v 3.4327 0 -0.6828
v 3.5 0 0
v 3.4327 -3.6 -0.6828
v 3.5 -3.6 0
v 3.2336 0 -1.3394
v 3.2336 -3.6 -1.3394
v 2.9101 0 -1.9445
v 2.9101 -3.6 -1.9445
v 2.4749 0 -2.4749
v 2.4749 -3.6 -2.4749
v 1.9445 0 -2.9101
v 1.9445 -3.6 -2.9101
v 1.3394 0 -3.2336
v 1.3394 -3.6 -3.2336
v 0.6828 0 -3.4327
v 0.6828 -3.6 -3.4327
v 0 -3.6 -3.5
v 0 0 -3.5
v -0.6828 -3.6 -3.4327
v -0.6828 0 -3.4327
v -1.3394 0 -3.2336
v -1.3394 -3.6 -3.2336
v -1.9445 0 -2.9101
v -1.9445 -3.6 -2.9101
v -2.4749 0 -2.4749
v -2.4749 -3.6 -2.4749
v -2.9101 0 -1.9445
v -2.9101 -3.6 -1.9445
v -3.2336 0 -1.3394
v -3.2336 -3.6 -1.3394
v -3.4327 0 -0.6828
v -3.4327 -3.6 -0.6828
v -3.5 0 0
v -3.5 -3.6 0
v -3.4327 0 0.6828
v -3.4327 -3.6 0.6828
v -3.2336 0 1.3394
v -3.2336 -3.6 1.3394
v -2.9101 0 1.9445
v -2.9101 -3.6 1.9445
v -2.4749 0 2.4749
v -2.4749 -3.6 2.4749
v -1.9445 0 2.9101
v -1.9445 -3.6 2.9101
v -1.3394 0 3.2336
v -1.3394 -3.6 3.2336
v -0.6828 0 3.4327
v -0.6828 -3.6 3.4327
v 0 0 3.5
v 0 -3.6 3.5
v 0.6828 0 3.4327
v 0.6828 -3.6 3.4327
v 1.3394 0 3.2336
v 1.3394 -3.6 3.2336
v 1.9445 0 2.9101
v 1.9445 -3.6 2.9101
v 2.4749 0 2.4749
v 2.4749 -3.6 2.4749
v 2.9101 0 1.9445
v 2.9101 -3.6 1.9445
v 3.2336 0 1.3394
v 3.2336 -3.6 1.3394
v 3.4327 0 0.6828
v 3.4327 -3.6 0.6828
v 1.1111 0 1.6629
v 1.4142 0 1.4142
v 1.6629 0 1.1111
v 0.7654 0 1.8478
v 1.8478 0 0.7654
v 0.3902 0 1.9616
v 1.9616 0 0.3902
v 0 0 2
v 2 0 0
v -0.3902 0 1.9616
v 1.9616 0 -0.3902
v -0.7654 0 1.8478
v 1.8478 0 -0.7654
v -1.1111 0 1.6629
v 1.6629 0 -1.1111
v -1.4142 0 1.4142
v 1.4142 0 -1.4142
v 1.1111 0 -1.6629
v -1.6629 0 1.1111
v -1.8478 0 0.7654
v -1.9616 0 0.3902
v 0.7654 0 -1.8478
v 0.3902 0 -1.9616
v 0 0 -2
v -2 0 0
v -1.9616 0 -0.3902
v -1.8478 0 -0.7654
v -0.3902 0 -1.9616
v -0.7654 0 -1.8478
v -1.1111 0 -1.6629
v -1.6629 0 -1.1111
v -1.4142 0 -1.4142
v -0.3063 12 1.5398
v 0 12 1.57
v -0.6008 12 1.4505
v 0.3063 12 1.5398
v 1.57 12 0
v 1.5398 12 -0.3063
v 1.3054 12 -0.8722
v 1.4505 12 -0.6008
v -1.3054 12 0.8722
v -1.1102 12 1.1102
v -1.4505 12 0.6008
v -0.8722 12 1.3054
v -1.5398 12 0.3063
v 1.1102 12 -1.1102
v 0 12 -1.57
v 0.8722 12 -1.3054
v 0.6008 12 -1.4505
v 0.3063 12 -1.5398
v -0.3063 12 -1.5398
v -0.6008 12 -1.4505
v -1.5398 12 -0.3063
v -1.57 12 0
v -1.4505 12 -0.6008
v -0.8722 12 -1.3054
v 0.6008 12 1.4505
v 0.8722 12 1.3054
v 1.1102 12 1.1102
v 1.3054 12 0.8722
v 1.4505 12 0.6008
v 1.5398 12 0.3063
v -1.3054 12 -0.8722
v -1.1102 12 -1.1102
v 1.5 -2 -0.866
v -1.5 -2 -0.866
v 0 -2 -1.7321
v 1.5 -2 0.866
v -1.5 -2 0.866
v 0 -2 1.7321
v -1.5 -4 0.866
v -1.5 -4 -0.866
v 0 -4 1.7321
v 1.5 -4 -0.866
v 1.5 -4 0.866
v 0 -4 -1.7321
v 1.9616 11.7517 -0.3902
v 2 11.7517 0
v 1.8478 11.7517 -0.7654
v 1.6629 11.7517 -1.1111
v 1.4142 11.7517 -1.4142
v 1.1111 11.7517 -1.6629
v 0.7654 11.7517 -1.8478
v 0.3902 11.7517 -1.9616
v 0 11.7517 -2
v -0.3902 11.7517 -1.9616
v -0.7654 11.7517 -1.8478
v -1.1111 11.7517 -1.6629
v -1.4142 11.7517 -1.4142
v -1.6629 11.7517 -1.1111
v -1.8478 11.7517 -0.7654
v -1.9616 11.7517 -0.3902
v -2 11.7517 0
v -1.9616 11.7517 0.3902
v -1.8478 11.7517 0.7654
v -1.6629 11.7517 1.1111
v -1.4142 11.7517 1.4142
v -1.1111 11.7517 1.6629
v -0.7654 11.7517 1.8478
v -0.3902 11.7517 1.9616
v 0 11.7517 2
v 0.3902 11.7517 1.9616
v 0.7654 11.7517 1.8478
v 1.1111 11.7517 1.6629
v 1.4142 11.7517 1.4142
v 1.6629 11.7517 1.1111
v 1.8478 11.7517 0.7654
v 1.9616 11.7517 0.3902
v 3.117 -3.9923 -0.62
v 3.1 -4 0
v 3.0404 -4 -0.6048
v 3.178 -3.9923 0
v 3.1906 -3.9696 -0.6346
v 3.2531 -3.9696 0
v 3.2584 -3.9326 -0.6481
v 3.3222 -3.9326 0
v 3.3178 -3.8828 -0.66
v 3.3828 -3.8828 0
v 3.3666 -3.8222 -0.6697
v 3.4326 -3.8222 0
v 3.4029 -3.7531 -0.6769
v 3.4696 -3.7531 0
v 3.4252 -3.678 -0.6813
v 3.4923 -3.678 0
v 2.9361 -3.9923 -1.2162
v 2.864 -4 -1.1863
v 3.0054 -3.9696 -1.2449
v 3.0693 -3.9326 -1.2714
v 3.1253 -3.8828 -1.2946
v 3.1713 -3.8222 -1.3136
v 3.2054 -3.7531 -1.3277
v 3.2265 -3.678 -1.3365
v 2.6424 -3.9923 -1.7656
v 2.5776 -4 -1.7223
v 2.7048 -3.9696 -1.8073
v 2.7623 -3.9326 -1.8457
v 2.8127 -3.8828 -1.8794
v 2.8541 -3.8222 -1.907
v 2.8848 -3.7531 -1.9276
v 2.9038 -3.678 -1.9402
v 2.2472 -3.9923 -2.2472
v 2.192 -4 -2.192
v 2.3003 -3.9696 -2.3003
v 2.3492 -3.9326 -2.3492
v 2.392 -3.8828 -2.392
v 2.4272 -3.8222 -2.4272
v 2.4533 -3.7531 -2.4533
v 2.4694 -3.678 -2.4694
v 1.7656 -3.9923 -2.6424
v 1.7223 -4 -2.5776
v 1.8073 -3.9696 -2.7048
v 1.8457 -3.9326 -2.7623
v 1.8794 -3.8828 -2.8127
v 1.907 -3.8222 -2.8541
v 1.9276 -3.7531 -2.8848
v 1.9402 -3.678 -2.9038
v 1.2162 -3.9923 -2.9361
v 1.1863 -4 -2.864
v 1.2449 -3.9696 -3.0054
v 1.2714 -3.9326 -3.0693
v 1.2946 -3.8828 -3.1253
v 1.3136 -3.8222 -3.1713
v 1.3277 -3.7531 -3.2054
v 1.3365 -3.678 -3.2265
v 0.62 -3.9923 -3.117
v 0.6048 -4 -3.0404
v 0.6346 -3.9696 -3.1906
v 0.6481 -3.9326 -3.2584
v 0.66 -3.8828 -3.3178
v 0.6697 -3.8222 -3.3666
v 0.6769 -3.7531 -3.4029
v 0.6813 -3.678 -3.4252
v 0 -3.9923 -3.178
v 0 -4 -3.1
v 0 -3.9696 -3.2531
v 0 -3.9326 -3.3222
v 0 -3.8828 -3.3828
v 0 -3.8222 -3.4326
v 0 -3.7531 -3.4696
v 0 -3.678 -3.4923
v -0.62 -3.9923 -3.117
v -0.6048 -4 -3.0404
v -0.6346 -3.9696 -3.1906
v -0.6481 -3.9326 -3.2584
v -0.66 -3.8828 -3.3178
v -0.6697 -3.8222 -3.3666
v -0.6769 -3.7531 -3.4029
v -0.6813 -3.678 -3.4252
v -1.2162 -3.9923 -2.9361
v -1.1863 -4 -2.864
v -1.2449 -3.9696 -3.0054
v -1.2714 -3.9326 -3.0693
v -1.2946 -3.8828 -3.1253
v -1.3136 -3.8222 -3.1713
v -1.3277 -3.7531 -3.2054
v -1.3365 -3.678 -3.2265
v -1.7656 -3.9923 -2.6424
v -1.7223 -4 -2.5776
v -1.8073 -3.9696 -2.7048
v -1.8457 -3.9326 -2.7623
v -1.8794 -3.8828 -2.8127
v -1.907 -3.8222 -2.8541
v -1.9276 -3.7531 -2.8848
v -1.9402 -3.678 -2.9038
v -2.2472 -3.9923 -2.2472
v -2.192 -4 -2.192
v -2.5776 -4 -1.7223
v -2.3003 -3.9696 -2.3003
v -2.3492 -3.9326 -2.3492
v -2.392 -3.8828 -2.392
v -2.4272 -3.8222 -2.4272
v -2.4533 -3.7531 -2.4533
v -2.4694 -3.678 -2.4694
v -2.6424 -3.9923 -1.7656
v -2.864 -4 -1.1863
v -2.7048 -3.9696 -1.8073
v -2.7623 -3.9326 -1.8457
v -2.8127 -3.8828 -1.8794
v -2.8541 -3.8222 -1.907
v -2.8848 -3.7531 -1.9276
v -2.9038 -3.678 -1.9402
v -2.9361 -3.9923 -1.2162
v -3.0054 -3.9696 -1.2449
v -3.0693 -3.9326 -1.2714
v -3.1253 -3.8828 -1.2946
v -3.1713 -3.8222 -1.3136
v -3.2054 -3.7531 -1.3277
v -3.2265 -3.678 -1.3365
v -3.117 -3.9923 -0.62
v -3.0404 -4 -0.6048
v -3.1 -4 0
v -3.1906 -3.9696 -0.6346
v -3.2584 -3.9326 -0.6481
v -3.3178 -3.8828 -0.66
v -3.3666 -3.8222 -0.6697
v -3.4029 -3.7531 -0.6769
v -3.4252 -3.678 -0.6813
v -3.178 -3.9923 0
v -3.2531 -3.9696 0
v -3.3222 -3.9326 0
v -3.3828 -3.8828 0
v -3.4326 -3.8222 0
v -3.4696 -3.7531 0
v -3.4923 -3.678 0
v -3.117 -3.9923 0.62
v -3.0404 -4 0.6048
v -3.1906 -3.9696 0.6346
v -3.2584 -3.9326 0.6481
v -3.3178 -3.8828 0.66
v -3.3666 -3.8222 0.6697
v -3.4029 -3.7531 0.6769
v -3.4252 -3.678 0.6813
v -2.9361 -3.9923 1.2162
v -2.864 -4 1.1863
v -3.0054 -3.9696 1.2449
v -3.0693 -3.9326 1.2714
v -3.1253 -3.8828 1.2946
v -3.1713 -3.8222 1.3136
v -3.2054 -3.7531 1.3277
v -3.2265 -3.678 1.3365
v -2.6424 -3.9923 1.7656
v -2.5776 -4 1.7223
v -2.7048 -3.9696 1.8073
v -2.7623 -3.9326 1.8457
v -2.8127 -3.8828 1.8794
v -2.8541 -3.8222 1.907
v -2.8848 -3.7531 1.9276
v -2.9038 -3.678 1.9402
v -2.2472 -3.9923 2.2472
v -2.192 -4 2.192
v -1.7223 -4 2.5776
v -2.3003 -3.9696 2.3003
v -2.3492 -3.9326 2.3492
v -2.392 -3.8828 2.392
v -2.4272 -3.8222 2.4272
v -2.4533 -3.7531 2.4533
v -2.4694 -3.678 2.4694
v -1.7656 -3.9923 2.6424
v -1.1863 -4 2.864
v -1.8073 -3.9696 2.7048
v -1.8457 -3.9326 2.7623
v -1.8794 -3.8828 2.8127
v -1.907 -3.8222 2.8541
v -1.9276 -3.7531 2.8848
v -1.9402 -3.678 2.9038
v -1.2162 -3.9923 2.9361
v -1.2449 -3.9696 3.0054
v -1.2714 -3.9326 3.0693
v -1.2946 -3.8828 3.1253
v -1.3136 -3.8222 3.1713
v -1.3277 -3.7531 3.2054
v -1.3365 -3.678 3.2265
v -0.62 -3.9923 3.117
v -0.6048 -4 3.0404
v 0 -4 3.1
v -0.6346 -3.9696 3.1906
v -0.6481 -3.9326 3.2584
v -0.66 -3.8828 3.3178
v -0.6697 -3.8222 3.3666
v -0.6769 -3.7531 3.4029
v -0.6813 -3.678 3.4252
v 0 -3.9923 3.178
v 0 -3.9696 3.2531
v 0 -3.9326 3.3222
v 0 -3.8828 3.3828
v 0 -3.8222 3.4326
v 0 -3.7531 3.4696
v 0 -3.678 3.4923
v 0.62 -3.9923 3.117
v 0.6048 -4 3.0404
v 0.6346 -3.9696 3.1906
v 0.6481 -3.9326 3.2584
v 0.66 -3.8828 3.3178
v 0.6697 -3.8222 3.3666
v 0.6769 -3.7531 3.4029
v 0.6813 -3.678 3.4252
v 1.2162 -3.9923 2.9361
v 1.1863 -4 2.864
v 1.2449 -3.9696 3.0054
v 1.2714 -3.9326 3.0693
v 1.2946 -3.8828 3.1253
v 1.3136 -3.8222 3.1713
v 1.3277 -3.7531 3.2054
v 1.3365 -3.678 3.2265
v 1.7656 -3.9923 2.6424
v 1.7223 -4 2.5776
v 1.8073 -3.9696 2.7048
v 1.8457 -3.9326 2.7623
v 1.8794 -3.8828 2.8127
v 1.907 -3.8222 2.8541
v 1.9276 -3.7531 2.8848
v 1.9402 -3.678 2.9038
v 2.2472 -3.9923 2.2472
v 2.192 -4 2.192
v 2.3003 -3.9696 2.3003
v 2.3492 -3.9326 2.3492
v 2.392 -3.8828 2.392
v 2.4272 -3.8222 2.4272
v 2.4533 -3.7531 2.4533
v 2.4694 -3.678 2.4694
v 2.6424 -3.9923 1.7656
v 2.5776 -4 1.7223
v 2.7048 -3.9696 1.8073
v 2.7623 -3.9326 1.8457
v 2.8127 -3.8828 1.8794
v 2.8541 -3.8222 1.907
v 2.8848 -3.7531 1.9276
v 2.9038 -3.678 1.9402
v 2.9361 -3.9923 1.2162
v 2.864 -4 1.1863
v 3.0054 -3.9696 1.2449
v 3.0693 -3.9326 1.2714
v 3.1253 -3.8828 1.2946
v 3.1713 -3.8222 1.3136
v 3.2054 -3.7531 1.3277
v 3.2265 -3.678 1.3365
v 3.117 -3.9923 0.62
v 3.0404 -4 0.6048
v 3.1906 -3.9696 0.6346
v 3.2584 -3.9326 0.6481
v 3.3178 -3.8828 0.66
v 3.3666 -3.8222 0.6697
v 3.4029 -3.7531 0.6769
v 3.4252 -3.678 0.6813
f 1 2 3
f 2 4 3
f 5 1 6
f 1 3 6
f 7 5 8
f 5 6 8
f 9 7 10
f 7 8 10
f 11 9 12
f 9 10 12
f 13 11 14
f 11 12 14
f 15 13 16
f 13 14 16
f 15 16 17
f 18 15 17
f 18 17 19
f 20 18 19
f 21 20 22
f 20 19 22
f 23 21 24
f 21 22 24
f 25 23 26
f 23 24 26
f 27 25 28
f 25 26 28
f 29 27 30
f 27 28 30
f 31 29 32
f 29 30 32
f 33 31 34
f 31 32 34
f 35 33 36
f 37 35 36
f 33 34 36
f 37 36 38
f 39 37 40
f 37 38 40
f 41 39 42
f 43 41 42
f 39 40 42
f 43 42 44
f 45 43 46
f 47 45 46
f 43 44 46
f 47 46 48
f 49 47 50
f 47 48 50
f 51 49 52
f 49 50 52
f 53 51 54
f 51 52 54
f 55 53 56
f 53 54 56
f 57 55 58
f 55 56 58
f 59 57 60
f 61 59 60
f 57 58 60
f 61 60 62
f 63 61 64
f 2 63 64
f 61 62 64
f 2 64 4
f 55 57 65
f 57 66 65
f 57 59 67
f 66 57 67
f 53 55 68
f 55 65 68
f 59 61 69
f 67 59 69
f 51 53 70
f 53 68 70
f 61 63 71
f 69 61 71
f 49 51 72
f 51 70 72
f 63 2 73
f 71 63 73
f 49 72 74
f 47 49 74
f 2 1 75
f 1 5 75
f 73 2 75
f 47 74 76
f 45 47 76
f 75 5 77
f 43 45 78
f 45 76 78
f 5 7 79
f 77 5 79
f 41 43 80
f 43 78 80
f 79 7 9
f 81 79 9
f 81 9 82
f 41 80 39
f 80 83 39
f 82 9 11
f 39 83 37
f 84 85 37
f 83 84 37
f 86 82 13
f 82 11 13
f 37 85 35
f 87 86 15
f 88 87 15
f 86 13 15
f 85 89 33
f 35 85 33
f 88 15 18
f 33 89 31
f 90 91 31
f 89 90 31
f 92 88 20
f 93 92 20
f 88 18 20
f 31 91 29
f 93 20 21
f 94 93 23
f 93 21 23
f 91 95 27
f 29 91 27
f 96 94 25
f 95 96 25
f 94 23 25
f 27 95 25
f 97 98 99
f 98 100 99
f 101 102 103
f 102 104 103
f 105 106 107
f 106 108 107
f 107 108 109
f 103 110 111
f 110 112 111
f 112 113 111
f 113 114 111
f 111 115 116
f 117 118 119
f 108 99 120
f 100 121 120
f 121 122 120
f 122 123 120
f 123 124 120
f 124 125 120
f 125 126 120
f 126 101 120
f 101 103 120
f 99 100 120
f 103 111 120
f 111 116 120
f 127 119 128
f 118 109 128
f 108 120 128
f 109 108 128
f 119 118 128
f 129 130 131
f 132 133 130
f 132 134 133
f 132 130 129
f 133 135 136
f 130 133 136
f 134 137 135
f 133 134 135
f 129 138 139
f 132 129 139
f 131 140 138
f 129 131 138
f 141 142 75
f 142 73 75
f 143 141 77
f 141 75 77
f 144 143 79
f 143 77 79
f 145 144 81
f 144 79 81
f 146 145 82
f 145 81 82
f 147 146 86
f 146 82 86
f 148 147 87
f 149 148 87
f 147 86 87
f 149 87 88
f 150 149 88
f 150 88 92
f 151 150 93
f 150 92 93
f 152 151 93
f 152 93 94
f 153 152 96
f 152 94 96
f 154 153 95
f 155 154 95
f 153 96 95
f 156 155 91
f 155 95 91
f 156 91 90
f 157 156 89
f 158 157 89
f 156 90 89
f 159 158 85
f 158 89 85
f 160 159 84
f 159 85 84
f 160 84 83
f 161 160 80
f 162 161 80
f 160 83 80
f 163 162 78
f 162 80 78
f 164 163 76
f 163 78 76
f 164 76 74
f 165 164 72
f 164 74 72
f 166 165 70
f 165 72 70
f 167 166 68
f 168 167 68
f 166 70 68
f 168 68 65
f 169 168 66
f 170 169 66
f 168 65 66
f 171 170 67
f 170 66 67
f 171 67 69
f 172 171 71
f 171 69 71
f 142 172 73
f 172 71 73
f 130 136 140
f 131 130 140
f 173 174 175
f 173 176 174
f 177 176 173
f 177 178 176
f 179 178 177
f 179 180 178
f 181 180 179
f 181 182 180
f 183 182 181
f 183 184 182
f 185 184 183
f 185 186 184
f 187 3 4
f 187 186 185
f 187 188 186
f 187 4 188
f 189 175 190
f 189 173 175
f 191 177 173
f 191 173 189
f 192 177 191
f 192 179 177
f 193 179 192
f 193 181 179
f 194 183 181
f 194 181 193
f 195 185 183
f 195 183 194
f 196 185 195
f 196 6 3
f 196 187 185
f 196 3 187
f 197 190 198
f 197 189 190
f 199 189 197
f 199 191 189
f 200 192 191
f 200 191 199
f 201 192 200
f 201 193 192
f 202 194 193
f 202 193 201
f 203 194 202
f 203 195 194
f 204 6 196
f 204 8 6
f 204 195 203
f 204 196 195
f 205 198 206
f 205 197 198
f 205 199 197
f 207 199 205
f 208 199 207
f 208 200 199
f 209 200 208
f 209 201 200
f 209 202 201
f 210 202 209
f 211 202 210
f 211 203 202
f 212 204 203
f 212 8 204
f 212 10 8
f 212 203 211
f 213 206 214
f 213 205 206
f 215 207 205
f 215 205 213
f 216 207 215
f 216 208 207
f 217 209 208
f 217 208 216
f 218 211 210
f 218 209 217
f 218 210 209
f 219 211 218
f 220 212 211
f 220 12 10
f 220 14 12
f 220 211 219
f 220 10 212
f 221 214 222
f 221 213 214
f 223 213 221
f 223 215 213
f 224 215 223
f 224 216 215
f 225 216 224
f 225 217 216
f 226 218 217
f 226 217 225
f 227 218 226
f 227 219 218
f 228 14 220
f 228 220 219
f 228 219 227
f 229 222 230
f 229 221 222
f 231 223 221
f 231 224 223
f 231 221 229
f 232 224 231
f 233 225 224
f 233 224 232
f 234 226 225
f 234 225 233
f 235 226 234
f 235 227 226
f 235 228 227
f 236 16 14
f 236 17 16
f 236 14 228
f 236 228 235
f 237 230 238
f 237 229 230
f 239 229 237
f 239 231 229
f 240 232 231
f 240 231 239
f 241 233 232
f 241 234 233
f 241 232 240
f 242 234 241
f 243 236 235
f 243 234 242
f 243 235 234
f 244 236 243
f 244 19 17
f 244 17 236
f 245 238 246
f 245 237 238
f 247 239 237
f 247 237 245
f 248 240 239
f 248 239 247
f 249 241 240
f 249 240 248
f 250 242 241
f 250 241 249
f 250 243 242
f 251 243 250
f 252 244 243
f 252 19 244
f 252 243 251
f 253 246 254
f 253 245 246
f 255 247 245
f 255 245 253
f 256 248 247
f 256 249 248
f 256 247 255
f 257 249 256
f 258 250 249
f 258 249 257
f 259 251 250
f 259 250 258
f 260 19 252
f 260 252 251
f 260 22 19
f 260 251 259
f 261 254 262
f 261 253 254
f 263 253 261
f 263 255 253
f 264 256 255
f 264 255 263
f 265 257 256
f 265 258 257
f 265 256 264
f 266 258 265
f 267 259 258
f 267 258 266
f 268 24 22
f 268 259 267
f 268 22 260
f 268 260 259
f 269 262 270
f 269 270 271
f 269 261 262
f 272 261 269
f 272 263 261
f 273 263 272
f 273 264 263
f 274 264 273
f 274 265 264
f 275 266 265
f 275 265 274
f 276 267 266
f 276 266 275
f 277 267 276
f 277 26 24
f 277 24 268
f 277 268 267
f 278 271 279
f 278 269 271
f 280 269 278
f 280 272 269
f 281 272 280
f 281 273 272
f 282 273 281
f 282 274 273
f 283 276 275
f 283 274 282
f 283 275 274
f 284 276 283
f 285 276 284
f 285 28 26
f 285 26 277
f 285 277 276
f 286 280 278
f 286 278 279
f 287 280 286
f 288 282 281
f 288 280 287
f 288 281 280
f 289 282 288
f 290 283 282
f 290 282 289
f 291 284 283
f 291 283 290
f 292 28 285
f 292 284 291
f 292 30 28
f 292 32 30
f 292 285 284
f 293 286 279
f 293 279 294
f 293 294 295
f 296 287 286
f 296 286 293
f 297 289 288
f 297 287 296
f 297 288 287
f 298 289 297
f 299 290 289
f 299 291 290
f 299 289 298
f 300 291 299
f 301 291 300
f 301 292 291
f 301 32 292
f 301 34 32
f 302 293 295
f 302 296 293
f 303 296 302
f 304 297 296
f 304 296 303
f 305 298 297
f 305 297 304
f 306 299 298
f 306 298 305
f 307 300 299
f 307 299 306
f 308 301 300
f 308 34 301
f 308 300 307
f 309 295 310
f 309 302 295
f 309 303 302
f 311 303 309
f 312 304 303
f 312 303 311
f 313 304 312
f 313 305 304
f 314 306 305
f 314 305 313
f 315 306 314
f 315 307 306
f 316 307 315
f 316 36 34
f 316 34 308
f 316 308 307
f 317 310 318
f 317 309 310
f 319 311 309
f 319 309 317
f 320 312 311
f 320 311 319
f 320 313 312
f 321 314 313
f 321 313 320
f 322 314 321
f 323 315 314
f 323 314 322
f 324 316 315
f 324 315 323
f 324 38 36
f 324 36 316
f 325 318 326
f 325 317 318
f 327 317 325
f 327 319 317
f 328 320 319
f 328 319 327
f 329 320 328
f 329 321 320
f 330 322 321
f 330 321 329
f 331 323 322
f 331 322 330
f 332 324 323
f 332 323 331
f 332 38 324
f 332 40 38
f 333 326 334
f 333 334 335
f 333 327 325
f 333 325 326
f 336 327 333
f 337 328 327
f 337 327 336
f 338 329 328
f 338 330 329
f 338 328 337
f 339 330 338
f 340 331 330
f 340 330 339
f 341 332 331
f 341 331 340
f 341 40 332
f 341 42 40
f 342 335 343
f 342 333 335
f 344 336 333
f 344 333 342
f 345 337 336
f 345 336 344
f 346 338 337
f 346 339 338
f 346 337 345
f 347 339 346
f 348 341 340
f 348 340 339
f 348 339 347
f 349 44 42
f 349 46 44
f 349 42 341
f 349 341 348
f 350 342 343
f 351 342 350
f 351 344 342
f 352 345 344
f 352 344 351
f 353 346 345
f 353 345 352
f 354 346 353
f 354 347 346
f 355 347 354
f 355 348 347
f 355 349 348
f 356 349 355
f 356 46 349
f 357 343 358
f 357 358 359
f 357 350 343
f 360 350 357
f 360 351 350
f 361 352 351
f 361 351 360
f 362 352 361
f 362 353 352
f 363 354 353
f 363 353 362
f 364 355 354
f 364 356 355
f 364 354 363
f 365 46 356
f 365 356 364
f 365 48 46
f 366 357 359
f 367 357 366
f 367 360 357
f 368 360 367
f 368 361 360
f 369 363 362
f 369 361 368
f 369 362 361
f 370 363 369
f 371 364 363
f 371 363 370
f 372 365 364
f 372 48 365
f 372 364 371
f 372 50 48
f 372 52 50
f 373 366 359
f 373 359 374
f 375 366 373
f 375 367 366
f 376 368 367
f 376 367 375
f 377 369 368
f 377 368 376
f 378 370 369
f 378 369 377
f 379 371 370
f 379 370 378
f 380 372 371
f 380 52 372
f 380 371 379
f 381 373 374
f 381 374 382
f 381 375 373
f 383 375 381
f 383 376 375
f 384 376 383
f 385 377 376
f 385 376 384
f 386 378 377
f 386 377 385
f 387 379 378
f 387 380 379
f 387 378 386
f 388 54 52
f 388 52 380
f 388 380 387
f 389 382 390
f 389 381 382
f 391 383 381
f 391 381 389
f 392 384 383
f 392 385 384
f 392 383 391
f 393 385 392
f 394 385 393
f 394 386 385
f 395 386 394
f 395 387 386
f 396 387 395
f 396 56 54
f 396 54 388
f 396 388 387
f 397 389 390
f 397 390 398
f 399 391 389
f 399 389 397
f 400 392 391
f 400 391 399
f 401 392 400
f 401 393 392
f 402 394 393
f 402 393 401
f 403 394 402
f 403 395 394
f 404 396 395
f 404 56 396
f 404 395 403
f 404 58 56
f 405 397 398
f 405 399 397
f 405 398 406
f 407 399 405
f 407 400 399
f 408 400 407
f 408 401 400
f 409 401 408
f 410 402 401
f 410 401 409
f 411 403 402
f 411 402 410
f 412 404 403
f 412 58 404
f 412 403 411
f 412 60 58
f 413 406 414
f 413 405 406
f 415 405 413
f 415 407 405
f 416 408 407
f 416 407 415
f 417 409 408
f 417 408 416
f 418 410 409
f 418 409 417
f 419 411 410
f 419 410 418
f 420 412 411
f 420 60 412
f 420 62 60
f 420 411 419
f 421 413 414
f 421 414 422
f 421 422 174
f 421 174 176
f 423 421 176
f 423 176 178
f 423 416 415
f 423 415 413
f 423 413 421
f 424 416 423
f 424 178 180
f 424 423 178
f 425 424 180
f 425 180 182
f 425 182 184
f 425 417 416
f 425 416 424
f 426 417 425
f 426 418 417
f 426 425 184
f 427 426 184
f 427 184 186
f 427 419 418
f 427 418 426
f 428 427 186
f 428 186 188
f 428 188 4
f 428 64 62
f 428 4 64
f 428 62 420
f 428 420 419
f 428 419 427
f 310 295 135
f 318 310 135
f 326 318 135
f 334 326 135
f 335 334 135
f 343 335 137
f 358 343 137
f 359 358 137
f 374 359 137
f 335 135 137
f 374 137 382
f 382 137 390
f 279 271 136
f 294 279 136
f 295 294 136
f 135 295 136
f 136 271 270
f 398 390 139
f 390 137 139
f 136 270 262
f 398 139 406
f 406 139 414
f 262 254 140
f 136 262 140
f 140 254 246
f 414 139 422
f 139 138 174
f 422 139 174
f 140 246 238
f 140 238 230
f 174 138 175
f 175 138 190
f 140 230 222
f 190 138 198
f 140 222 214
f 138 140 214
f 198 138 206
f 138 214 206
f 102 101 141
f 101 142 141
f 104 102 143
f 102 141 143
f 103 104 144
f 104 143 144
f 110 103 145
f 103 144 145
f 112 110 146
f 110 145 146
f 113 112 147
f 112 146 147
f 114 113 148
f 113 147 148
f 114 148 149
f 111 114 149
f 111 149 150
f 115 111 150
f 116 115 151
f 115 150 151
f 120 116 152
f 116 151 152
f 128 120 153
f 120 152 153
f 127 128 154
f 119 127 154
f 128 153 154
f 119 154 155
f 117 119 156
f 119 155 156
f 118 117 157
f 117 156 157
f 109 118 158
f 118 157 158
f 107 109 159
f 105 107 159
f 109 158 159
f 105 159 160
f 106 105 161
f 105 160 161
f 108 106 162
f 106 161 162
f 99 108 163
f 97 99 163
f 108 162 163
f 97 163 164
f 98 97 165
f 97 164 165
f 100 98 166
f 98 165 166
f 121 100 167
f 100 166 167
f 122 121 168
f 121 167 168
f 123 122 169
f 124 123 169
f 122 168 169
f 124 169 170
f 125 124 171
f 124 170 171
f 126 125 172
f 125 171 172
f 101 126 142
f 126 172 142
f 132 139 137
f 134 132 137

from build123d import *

# Parameters (mm, degrees)
POCKET_DEPTH = 2


with BuildPart() as part:
    # Sketch → Revolution (revolve)
    with BuildSketch(Plane.XY):
        with BuildLine():
            Line((2, 0), (3.5, 0))
            Line((3.5, 0), (3.5, -3.6))
            ThreePointArc((3.1, -4), (3.382843, -3.882843), (3.5, -3.6))
            Line((3.1, -4), (0, -4))
            Line((0, -4), (0, 12))
            Line((0, 12), (1.57, 12))
            Line((1.57, 12), (2, 11.751739))
            Line((2, 11.751739), (2, 0))
        make_face()
    revolve(axis=Axis((0, 0, 0), (0, 1, 0)))

    # Sketch001 → Pocket (cut)
    with BuildSketch(Plane.XZ.offset(4)):
        Polygon((-1.5, 0.866025), (-1.5, -0.866025), (0, -1.732051), (1.5, -0.866025), (1.5, 0.866025), (0, 1.732051), align=None)
    extrude(amount=-POCKET_DEPTH, mode=Mode.SUBTRACT)


solid = part.part
